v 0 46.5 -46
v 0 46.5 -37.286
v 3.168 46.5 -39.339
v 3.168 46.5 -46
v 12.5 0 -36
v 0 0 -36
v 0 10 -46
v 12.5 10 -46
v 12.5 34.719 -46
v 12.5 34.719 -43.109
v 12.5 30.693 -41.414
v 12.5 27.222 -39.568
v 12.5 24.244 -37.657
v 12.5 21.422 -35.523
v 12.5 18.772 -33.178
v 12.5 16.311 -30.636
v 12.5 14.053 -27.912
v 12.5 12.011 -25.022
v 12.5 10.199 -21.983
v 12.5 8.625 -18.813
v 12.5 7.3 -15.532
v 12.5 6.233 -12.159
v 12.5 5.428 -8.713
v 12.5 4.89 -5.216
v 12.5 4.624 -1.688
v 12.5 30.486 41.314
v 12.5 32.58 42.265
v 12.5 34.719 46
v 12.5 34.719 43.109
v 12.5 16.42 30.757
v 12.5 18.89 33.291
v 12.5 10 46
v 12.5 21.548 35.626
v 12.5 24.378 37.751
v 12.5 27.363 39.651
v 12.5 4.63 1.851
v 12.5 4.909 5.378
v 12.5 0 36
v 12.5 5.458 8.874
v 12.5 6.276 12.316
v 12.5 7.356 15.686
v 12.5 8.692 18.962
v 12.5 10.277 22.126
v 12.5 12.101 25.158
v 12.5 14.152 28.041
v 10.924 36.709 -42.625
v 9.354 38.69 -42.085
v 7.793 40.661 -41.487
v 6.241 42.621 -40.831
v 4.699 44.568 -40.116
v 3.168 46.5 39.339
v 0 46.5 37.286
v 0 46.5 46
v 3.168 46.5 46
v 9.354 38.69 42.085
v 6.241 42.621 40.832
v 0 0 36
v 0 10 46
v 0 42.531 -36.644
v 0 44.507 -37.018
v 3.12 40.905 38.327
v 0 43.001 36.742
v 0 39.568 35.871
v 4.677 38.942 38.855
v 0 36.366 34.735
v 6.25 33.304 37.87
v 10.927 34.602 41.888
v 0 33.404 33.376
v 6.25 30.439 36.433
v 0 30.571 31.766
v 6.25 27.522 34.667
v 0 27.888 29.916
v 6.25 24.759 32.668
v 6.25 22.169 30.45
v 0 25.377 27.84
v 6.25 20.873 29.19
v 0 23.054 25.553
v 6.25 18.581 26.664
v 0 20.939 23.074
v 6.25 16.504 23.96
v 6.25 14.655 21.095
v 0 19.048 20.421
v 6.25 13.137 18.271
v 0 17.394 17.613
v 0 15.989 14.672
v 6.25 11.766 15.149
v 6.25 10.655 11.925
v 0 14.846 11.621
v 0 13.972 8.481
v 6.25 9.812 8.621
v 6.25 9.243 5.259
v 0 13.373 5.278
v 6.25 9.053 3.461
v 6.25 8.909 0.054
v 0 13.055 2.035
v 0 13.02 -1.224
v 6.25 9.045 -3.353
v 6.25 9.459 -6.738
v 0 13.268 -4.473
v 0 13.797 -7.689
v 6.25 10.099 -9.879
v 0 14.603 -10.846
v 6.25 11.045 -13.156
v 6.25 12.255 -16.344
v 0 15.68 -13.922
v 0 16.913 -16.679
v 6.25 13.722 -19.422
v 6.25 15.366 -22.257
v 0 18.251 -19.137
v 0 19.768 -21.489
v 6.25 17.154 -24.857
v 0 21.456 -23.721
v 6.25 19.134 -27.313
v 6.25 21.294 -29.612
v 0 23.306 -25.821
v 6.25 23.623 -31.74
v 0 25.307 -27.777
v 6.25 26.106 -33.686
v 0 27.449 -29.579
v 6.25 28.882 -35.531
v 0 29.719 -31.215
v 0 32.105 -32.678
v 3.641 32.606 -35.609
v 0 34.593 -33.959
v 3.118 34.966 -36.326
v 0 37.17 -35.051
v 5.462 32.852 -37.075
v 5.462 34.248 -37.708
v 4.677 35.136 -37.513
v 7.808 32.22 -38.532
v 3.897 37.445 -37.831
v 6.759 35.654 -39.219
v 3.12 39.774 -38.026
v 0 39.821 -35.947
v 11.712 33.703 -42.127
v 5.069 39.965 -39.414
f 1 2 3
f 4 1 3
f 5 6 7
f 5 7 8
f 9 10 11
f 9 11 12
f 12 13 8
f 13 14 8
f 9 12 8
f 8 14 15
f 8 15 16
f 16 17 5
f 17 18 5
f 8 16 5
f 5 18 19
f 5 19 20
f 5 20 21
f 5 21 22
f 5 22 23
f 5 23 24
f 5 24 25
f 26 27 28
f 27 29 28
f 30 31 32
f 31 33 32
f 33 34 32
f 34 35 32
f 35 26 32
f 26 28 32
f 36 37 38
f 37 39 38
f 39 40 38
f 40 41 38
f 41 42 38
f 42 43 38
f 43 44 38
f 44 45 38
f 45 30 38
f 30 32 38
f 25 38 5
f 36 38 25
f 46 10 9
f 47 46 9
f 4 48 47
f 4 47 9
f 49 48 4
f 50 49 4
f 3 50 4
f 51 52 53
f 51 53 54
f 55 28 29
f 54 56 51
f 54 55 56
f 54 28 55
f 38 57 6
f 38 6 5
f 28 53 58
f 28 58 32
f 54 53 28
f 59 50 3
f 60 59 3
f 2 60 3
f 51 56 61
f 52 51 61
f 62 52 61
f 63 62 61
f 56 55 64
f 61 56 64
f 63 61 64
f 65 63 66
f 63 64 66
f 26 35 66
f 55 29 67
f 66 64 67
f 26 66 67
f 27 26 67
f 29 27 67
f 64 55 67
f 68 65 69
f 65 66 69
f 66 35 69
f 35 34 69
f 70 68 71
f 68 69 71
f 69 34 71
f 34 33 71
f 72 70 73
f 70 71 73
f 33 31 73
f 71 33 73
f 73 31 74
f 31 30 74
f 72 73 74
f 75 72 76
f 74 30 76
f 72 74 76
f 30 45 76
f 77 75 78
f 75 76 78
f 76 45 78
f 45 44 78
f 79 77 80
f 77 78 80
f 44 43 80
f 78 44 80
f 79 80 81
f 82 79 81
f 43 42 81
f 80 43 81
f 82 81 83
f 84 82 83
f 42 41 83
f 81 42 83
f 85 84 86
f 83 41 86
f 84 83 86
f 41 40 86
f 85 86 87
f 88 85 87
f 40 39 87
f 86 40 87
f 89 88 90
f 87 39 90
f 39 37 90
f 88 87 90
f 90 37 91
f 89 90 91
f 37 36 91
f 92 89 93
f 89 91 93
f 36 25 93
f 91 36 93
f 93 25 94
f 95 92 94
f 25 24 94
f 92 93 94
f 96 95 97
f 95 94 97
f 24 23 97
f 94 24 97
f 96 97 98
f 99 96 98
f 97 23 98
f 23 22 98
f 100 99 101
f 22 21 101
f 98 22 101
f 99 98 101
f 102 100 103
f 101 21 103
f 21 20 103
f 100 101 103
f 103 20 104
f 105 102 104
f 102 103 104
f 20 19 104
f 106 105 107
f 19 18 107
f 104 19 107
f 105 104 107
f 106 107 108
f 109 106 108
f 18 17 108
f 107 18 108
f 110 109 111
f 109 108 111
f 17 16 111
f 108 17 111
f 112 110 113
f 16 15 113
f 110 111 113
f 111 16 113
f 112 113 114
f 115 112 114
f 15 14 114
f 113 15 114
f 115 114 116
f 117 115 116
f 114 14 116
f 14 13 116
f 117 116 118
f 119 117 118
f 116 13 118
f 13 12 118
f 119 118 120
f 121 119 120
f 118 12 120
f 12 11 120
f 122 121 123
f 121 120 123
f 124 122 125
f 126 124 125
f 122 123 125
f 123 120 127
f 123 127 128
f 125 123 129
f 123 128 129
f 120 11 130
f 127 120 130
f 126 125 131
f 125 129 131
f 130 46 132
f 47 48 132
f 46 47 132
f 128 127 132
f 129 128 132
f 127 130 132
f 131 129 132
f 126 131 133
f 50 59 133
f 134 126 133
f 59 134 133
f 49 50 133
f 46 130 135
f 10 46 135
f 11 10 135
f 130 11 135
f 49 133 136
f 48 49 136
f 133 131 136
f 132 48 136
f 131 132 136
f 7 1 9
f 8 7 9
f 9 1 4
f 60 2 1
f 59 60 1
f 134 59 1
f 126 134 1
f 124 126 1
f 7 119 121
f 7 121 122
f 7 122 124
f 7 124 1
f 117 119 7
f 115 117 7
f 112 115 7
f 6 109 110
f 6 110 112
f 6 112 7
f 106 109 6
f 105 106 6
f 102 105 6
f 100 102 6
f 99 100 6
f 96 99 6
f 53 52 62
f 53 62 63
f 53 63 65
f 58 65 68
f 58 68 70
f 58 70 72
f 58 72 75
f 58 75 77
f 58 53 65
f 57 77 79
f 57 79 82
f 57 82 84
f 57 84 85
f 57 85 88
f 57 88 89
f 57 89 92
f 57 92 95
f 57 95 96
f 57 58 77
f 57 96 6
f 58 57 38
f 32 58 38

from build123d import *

# Parameters (mm, degrees)
BOSS_EXTRUDE1_DEPTH     = 46
CUT_EXTRUDE1_DEPTH      = 113.313178374
CHAMFER1_SIZE           = 10
CUT_EXTRUDE2_DEPTH      = 106.690586293
CUT_EXTRUDE2_DEPTH_BACK = 106.690586293
SKETCH5_W               = 3.168316832
SKETCH5_H               = 4


with BuildPart() as part:
    # Sketch1 → Boss-Extrude1 (new, symmetric)
    with BuildSketch(Plane.XY):
        Polygon((0, 0), (40, 0), (0, 50.5), align=None)
    extrude(amount=BOSS_EXTRUDE1_DEPTH, both=True)

    # Cut-Loft1: read off the stored shape, not the designer's step
    # Cut-Loft1: loft between two sections, ruled curve by curve
    cut_loft1_from = [
        Edge.make_bspline([(0, 87.819982257, -3.673389342), (0, 88.152798689, -0.291487961), (0, 88.022862533, 3.13586039), (0, 86.913116995, 9.45832515), (0, 85.146489417, 15.281995192), (0, 80.482269823, 23.129239399), (0, 74.07599018, 29.632605234), (0, 68.891494438, 32.819627302), (0, 63.05780063, 35.497893971), (0, 56.493578605, 37.489222603), (0, 46.206217119, 37.721421955), (0, 36.234588822, 35.183081039), (0, 27.310758236, 30.060050466), (0, 20.090332485, 22.728908224), (0, 15.103972214, 13.728199544), (0, 12.717265155, 3.718836313), (0, 12.977137467, -3.13586039), (0, 14.086883005, -9.45832515), (0, 15.853510583, -15.281995192), (0, 20.517730177, -23.129239399), (0, 26.92400982, -29.632605234), (0, 32.108505562, -32.819627302), (0, 37.94219937, -35.497893971), (0, 44.506421395, -37.489222603), (0, 54.793782881, -37.721421955), (0, 64.765411178, -35.183081039), (0, 73.689241764, -30.060050466), (0, 80.909667515, -22.728908224), (0, 85.896027786, -13.728199544), (0, 87.487165825, -7.055290723), (0, 87.819982257, -3.673389342)], [0.302884615, 0.302884615, 0.302884615, 0.302884615, 0.346153846, 0.346153846, 0.384615385, 0.423076923, 0.461538462, 0.5, 0.5, 0.543269231, 0.586538462, 0.629807692, 0.673076923, 0.716346154, 0.759615385, 0.802884615, 0.846153846, 0.846153846, 0.884615385, 0.923076923, 0.961538462, 1, 1, 1.043269231, 1.086538462, 1.129807692, 1.173076923, 1.216346154, 1.259615385, 1.302884615, 1.302884615, 1.302884615, 1.302884615], 3),
    ]
    cut_loft1_to = [
        Edge.make_bspline([(25, 104.882230946, 8.223529932), (25, 104.136933431, 13.151573537), (25, 102.717354983, 17.977504325), (25, 98.861671081, 26.566476385), (25, 94.251793354, 34.209630574), (25, 84.793260692, 43.685771848), (25, 73.342186447, 50.623638392), (25, 64.823003498, 53.286775734), (25, 55.564139969, 54.99270233), (25, 45.514164495, 55.458788951), (25, 30.804709403, 52.082462001), (25, 17.542342514, 44.880945638), (25, 6.700897593, 34.382224999), (25, -0.923210446, 21.357900078), (25, -4.769561623, 6.764826515), (25, -4.55651188, -8.325642749), (25, -1.717354983, -17.977504325), (25, 2.138328919, -26.566476385), (25, 6.748206646, -34.209630574), (25, 16.206739308, -43.685771848), (25, 27.657813553, -50.623638392), (25, 36.176996502, -53.286775734), (25, 45.435860031, -54.99270233), (25, 55.485835505, -55.458788951), (25, 70.195290597, -52.082462001), (25, 83.457657486, -44.880945638), (25, 94.299102407, -34.382224999), (25, 101.923210446, -21.357900078), (25, 105.769561623, -6.764826515), (25, 105.627528461, 3.295486328), (25, 104.882230946, 8.223529932)], [0.302884615, 0.302884615, 0.302884615, 0.302884615, 0.346153846, 0.346153846, 0.384615385, 0.423076923, 0.461538462, 0.5, 0.5, 0.543269231, 0.586538462, 0.629807692, 0.673076923, 0.716346154, 0.759615385, 0.802884615, 0.846153846, 0.846153846, 0.884615385, 0.923076923, 0.961538462, 1, 1, 1.043269231, 1.086538462, 1.129807692, 1.173076923, 1.216346154, 1.259615385, 1.302884615, 1.302884615, 1.302884615, 1.302884615], 3),
    ]
    cut_loft1 = Solid(Shell([*[Face.make_surface_from_curves(cut_loft1_from[k], cut_loft1_to[k]) for k in range(1)], Face(Wire(cut_loft1_from)), Face(Wire(cut_loft1_to))]))
    add(cut_loft1, mode=Mode.SUBTRACT)

    # Sketch4 → Cut-Extrude1 (cut, through all)
    with BuildSketch(Plane.XY.offset(46)):
        Polygon((40, 0), (12.5, 34.71875), (12.5, 0), align=None)
    extrude(amount=-CUT_EXTRUDE1_DEPTH, mode=Mode.SUBTRACT)

    # Chamfer1
    chamfer1_edges = [part.edges().sort_by_distance(p)[0] for p in [
        (6.25, 0, -46),
        (6.25, 0, 46),
    ]]
    chamfer(chamfer1_edges, length=CHAMFER1_SIZE)

    # Sketch5 → Cut-Extrude2 (cut, two sides: drawn at the far end of the back side and taken through both)
    with BuildSketch(Plane.XY.offset(46).offset(-CUT_EXTRUDE2_DEPTH_BACK)):
        with Locations((1.584158416, 48.5)):
            Rectangle(SKETCH5_W, SKETCH5_H)
    extrude(amount=CUT_EXTRUDE2_DEPTH + CUT_EXTRUDE2_DEPTH_BACK, mode=Mode.SUBTRACT)


solid = part.part
